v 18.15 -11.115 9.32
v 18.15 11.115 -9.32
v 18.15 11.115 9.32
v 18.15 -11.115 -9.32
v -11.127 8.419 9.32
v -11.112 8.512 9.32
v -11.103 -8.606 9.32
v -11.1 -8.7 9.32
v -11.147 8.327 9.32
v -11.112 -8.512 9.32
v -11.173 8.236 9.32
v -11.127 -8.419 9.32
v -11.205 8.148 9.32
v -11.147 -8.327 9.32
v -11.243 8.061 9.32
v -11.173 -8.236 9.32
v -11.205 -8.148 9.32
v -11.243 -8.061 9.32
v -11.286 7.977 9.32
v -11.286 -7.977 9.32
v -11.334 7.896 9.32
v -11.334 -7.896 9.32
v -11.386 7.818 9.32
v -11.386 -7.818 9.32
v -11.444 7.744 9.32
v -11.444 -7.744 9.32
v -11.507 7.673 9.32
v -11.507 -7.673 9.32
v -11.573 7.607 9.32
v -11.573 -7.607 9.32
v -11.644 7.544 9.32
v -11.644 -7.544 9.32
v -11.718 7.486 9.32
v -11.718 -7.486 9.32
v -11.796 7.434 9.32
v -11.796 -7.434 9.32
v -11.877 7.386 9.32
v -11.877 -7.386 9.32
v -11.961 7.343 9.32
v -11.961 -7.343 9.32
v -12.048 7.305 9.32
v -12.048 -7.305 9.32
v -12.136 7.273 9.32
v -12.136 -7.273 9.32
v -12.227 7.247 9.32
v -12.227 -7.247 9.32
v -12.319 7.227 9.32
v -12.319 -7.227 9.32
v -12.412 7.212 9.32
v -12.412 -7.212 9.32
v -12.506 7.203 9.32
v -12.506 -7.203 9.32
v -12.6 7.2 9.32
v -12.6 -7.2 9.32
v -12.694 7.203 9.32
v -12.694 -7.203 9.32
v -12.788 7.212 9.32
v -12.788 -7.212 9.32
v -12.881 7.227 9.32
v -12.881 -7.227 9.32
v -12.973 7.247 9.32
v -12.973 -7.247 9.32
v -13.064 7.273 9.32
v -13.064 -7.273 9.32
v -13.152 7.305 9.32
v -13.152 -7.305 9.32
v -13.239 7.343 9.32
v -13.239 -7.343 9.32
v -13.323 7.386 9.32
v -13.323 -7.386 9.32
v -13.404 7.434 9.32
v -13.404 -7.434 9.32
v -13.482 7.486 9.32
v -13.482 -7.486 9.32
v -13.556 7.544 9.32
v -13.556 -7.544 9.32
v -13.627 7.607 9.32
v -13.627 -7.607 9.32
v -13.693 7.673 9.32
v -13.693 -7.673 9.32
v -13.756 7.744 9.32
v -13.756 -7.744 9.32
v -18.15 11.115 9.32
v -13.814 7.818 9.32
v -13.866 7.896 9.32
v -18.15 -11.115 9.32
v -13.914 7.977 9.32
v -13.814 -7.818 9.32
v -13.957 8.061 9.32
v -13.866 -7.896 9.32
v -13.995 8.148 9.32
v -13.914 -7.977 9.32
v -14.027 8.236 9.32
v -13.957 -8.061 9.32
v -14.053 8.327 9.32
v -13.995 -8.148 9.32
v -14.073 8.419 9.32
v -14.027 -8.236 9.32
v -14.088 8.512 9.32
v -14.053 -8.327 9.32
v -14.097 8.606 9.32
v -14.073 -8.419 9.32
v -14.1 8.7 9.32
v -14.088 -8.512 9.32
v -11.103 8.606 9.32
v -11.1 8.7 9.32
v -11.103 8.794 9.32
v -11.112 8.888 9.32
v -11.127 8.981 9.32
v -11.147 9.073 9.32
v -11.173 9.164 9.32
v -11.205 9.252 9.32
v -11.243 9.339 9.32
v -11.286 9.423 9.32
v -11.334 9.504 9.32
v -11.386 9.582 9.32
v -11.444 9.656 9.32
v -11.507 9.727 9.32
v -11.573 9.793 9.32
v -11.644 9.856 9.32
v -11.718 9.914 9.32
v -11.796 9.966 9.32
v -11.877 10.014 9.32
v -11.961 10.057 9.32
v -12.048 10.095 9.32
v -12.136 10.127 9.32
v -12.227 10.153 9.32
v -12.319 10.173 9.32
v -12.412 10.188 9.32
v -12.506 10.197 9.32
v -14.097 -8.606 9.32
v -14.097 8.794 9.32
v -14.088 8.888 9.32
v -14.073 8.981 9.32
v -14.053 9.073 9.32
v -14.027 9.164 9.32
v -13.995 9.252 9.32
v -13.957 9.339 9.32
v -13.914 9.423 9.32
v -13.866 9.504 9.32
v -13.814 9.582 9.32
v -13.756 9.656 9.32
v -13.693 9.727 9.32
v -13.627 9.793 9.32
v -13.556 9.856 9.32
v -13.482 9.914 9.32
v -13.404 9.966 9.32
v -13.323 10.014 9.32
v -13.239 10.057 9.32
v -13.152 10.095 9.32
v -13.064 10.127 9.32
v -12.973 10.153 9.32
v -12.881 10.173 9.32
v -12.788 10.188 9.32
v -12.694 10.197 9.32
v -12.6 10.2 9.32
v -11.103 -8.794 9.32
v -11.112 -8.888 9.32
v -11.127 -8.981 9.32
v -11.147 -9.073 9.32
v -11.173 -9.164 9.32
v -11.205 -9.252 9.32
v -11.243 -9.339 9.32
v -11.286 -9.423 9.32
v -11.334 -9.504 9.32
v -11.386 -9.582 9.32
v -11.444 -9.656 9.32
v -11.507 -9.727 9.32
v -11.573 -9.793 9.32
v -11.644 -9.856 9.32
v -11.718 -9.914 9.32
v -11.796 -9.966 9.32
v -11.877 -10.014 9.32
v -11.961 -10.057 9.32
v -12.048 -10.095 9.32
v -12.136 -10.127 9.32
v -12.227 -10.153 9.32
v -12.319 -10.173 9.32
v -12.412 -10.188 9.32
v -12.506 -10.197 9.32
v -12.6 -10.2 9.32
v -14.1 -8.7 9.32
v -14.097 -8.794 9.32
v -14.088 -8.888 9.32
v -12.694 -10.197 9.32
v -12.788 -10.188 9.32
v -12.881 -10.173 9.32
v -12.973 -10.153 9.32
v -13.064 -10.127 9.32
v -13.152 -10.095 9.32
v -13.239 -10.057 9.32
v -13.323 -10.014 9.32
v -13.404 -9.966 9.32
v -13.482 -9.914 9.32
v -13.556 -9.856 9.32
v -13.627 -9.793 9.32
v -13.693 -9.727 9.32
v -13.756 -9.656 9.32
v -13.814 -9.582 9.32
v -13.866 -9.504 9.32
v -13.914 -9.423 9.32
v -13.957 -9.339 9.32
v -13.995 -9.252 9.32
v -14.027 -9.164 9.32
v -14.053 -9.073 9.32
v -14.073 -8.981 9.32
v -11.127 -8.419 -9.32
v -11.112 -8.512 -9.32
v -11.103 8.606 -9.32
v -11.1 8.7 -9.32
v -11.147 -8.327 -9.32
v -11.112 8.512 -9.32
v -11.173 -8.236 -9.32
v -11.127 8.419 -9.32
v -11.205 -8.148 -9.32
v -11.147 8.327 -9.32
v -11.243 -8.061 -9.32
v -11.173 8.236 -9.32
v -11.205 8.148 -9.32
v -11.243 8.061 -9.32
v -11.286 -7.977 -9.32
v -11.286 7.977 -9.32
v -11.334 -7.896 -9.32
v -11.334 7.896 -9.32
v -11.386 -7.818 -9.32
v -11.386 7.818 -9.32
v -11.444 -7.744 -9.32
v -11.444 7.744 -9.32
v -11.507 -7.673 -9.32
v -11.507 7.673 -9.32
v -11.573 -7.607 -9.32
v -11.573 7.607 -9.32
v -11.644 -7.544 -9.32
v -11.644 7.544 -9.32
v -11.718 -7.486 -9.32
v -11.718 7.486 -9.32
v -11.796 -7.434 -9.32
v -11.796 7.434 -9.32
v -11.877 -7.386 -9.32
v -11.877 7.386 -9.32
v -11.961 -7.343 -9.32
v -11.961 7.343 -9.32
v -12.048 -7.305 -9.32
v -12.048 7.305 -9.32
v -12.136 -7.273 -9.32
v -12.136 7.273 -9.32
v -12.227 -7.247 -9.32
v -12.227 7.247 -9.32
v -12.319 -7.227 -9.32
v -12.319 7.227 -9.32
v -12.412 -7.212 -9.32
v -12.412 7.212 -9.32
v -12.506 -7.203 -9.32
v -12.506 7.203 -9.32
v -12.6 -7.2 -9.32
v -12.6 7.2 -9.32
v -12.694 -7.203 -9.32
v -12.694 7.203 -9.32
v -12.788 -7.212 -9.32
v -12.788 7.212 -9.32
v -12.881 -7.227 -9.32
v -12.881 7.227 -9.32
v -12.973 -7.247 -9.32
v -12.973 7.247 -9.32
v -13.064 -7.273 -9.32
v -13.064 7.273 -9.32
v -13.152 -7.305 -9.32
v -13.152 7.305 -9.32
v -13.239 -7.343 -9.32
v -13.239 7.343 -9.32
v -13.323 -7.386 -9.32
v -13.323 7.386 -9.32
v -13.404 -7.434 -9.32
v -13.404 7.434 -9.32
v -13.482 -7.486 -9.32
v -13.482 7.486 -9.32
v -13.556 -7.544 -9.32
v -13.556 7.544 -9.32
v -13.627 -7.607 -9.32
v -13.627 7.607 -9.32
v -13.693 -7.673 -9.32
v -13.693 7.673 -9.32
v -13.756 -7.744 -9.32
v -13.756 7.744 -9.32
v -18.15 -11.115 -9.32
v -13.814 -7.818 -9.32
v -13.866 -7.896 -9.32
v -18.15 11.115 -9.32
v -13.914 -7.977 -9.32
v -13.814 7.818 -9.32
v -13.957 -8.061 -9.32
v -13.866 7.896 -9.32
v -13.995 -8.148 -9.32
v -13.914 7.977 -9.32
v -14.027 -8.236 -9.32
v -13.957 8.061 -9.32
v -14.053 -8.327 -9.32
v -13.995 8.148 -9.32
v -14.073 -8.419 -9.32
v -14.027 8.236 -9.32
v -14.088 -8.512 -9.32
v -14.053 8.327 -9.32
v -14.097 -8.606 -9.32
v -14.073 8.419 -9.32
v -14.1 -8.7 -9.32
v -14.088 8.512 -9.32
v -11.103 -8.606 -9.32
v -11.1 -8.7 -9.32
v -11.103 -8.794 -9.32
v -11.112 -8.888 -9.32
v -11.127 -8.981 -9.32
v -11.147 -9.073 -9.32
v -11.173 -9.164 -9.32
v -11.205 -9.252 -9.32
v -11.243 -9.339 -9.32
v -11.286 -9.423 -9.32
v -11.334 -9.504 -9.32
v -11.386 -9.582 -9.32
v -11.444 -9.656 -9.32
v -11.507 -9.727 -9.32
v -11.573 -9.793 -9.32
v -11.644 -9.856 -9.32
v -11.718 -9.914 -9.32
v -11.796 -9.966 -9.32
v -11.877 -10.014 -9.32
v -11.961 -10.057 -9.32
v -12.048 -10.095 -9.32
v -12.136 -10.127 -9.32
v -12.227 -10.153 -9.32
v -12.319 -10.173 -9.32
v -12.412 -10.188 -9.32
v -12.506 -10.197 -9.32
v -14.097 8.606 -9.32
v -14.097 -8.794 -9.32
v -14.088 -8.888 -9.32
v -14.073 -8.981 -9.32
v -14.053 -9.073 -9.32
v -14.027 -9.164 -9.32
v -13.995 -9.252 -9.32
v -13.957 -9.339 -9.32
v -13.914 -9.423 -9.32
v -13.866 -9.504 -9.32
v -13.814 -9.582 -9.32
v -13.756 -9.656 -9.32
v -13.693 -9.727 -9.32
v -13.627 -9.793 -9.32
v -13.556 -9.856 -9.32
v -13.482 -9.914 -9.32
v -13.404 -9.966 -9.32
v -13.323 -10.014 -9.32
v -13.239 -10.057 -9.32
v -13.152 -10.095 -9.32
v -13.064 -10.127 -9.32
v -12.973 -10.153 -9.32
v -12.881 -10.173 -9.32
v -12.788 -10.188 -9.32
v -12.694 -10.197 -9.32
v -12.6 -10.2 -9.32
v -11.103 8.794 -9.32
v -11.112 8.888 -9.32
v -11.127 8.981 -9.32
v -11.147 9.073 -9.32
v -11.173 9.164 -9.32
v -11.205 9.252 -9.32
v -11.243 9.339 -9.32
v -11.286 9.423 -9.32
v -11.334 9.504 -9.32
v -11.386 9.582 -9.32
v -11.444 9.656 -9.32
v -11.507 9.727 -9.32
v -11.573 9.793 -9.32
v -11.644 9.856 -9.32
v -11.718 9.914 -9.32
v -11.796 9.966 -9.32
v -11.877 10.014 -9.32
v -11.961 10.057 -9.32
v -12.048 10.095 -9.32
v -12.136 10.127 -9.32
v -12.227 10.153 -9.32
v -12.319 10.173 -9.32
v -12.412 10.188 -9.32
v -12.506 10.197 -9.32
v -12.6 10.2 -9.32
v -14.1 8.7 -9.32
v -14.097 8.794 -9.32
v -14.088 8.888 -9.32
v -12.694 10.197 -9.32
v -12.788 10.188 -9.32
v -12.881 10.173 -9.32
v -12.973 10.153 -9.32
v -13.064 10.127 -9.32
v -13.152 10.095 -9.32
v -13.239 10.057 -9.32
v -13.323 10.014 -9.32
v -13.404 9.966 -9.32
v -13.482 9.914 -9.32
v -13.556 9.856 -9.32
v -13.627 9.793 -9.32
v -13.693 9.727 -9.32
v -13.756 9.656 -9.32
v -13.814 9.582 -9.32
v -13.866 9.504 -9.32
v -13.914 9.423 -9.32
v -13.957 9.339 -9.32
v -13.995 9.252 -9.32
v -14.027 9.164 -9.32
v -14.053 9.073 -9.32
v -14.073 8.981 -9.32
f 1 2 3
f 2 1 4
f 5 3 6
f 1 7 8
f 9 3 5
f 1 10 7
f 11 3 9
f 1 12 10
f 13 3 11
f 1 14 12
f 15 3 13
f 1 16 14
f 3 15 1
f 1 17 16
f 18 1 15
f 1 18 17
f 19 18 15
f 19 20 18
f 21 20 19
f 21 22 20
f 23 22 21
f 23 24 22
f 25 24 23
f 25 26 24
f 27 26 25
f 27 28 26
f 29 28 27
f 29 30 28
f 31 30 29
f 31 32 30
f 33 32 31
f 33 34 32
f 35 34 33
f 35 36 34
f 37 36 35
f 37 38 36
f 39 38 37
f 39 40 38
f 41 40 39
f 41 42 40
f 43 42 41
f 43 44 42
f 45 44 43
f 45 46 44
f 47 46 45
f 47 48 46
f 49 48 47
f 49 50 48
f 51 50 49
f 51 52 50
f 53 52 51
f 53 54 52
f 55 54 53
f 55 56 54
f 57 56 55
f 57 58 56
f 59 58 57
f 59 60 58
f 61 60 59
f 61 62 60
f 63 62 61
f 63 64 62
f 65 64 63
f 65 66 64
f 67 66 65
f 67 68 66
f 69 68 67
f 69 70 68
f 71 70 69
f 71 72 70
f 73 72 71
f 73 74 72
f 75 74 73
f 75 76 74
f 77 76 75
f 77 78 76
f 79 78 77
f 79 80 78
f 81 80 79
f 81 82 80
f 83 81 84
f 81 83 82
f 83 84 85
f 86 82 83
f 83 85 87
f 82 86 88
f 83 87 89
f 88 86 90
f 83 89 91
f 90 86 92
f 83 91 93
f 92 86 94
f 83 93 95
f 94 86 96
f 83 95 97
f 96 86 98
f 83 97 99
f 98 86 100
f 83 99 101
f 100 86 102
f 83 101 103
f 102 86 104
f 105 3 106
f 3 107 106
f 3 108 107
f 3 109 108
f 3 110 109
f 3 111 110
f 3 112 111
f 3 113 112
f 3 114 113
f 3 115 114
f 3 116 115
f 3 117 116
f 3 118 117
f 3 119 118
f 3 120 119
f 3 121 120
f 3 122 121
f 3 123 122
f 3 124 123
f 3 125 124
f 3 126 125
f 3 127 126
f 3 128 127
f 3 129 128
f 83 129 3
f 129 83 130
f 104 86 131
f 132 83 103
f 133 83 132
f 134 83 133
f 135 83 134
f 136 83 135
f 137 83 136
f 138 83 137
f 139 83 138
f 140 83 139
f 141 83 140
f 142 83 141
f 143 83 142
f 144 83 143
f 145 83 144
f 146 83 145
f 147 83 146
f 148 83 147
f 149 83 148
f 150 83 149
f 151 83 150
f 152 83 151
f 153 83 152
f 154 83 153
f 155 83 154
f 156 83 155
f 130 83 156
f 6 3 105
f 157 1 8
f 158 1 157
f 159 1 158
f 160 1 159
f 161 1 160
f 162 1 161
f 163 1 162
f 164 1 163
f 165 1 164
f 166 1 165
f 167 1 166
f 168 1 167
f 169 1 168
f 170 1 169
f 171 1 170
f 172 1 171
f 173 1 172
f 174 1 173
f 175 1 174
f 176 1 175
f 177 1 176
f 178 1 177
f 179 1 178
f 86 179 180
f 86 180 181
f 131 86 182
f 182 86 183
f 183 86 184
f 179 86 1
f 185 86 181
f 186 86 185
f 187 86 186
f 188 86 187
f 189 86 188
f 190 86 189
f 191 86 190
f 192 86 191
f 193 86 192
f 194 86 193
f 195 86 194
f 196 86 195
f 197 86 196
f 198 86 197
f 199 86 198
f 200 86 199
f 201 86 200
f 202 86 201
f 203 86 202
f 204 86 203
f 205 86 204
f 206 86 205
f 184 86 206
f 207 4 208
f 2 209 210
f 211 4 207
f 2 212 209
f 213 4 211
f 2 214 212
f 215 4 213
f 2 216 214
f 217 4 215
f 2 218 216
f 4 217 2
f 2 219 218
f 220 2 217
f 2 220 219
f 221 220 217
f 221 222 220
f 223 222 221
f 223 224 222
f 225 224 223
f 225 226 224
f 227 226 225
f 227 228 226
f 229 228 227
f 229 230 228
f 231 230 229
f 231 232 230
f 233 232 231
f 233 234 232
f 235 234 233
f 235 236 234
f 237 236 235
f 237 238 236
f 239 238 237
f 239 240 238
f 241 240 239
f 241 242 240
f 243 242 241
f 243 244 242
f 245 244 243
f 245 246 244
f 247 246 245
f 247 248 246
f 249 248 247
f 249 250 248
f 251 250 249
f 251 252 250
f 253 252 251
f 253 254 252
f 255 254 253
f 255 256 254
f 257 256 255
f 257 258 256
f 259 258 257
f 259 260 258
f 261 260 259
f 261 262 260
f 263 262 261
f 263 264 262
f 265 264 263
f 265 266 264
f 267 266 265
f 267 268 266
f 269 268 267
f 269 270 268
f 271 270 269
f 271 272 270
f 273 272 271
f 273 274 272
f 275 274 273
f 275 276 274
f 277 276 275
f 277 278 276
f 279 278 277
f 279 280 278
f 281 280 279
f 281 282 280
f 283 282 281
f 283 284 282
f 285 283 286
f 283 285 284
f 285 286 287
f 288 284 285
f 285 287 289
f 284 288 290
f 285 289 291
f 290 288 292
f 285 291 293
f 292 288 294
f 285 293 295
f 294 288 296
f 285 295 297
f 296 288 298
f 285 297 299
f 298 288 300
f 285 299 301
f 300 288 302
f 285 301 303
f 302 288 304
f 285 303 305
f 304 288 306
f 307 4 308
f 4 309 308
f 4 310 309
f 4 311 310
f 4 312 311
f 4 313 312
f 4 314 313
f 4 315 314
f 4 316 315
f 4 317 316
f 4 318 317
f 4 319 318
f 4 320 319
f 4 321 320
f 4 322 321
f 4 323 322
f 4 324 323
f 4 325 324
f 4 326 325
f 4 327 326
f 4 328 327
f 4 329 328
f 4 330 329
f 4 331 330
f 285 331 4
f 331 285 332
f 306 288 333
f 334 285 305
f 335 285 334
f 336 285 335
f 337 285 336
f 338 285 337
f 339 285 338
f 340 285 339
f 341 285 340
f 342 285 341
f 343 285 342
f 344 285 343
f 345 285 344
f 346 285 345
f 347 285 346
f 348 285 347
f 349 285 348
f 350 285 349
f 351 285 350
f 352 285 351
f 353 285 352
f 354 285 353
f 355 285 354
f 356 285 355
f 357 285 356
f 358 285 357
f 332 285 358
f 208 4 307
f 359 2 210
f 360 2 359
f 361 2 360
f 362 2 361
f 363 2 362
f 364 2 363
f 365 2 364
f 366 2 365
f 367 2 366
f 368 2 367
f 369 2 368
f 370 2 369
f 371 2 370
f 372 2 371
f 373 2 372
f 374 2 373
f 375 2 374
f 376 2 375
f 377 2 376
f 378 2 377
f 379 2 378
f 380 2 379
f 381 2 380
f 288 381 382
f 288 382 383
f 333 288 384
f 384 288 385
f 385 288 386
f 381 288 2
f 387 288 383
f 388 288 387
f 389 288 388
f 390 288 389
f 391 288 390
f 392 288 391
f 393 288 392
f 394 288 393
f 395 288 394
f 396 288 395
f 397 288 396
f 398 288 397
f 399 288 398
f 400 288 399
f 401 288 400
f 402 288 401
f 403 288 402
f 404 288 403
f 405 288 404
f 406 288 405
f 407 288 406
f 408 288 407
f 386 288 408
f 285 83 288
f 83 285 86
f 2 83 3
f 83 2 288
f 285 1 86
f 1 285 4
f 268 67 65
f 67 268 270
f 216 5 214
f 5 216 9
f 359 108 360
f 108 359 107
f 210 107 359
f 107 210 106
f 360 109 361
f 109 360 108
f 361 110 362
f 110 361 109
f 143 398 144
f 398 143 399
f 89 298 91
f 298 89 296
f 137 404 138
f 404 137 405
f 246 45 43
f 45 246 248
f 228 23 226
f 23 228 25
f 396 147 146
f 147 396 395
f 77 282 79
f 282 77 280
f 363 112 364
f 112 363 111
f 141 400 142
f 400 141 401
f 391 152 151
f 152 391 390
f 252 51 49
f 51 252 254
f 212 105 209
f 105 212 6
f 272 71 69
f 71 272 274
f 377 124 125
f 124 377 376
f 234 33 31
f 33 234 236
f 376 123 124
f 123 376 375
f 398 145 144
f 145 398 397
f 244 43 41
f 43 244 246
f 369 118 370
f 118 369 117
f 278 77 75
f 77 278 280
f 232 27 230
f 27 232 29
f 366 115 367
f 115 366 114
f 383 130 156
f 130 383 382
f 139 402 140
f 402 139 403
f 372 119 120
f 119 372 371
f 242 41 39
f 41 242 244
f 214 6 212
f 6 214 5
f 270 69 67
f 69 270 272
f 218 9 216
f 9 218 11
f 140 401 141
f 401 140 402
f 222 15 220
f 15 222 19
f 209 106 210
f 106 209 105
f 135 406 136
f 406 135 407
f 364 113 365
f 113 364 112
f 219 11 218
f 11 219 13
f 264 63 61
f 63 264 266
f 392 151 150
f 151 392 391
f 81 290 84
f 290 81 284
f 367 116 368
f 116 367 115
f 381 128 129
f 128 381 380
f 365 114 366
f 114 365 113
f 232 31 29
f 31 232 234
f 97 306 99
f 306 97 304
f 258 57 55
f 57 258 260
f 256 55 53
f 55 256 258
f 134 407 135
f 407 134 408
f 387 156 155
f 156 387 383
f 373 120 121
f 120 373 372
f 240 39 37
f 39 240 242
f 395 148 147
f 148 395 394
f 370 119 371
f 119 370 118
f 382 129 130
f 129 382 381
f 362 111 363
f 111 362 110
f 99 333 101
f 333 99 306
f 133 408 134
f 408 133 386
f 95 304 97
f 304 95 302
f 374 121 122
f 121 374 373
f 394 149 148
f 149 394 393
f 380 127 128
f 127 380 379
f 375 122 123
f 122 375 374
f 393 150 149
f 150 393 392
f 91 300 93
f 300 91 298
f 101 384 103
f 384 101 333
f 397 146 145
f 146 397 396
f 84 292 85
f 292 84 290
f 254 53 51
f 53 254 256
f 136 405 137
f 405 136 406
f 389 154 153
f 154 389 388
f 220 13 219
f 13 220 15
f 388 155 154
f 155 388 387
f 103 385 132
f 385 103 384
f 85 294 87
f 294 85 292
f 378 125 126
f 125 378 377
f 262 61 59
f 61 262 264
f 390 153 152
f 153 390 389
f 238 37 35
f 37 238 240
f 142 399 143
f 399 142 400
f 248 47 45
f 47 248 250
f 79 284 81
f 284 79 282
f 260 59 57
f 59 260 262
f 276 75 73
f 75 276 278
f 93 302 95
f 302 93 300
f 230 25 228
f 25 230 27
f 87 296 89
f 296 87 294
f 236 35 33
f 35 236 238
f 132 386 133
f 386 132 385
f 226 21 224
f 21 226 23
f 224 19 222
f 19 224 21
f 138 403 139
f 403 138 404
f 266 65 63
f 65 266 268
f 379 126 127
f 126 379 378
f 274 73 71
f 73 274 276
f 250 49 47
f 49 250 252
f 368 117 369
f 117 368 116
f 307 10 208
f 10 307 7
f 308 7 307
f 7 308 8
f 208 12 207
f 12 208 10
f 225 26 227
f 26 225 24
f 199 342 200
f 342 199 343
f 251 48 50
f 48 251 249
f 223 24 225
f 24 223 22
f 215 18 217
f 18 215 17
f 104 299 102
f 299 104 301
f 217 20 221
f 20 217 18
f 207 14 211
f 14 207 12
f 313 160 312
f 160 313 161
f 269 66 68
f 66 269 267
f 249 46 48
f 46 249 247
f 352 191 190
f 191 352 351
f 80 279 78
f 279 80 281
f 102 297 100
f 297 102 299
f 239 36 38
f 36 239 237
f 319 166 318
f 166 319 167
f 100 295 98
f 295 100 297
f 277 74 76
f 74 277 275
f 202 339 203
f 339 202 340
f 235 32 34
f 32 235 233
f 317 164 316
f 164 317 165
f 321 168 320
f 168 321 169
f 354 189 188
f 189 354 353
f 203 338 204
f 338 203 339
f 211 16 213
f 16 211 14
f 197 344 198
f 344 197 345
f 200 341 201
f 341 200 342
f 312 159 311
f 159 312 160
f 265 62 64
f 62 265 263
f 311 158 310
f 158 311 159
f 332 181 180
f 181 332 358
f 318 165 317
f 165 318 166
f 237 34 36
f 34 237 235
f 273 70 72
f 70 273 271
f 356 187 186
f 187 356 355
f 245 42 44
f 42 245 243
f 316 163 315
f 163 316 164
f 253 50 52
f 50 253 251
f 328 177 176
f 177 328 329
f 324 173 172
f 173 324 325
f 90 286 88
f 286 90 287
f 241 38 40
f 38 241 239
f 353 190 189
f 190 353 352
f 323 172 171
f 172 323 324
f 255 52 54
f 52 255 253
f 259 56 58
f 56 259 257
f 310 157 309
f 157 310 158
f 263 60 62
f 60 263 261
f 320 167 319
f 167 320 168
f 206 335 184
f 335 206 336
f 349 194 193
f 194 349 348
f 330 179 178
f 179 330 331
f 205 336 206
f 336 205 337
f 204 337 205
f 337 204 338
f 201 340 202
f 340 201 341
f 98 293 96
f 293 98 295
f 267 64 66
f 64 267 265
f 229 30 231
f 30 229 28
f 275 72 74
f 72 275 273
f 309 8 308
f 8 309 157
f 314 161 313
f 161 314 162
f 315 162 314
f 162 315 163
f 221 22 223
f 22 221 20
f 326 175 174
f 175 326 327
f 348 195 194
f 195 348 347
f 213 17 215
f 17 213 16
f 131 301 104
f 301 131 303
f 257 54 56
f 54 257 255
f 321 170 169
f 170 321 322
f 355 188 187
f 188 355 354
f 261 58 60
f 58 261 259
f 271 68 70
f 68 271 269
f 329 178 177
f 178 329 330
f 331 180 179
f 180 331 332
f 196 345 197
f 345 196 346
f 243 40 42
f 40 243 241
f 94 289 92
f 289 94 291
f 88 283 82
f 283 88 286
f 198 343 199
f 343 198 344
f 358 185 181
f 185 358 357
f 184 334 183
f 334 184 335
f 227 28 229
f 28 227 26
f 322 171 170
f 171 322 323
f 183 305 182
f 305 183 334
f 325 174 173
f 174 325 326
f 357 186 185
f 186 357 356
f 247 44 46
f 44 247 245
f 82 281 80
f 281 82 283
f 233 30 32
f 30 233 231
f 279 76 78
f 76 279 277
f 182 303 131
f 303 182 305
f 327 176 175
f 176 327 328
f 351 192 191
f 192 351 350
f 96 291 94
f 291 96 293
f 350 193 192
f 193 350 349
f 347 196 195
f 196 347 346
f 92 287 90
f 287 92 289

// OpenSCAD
$fn = 100;

difference()
{
    cube([36.3,22.23,18.64], center=true);
    translate([-12.6,8.7,0]) cylinder(d=3,h=30, center=true);
    translate([-12.6,-8.7,0]) cylinder(d=3,h=30, center=true);
}
